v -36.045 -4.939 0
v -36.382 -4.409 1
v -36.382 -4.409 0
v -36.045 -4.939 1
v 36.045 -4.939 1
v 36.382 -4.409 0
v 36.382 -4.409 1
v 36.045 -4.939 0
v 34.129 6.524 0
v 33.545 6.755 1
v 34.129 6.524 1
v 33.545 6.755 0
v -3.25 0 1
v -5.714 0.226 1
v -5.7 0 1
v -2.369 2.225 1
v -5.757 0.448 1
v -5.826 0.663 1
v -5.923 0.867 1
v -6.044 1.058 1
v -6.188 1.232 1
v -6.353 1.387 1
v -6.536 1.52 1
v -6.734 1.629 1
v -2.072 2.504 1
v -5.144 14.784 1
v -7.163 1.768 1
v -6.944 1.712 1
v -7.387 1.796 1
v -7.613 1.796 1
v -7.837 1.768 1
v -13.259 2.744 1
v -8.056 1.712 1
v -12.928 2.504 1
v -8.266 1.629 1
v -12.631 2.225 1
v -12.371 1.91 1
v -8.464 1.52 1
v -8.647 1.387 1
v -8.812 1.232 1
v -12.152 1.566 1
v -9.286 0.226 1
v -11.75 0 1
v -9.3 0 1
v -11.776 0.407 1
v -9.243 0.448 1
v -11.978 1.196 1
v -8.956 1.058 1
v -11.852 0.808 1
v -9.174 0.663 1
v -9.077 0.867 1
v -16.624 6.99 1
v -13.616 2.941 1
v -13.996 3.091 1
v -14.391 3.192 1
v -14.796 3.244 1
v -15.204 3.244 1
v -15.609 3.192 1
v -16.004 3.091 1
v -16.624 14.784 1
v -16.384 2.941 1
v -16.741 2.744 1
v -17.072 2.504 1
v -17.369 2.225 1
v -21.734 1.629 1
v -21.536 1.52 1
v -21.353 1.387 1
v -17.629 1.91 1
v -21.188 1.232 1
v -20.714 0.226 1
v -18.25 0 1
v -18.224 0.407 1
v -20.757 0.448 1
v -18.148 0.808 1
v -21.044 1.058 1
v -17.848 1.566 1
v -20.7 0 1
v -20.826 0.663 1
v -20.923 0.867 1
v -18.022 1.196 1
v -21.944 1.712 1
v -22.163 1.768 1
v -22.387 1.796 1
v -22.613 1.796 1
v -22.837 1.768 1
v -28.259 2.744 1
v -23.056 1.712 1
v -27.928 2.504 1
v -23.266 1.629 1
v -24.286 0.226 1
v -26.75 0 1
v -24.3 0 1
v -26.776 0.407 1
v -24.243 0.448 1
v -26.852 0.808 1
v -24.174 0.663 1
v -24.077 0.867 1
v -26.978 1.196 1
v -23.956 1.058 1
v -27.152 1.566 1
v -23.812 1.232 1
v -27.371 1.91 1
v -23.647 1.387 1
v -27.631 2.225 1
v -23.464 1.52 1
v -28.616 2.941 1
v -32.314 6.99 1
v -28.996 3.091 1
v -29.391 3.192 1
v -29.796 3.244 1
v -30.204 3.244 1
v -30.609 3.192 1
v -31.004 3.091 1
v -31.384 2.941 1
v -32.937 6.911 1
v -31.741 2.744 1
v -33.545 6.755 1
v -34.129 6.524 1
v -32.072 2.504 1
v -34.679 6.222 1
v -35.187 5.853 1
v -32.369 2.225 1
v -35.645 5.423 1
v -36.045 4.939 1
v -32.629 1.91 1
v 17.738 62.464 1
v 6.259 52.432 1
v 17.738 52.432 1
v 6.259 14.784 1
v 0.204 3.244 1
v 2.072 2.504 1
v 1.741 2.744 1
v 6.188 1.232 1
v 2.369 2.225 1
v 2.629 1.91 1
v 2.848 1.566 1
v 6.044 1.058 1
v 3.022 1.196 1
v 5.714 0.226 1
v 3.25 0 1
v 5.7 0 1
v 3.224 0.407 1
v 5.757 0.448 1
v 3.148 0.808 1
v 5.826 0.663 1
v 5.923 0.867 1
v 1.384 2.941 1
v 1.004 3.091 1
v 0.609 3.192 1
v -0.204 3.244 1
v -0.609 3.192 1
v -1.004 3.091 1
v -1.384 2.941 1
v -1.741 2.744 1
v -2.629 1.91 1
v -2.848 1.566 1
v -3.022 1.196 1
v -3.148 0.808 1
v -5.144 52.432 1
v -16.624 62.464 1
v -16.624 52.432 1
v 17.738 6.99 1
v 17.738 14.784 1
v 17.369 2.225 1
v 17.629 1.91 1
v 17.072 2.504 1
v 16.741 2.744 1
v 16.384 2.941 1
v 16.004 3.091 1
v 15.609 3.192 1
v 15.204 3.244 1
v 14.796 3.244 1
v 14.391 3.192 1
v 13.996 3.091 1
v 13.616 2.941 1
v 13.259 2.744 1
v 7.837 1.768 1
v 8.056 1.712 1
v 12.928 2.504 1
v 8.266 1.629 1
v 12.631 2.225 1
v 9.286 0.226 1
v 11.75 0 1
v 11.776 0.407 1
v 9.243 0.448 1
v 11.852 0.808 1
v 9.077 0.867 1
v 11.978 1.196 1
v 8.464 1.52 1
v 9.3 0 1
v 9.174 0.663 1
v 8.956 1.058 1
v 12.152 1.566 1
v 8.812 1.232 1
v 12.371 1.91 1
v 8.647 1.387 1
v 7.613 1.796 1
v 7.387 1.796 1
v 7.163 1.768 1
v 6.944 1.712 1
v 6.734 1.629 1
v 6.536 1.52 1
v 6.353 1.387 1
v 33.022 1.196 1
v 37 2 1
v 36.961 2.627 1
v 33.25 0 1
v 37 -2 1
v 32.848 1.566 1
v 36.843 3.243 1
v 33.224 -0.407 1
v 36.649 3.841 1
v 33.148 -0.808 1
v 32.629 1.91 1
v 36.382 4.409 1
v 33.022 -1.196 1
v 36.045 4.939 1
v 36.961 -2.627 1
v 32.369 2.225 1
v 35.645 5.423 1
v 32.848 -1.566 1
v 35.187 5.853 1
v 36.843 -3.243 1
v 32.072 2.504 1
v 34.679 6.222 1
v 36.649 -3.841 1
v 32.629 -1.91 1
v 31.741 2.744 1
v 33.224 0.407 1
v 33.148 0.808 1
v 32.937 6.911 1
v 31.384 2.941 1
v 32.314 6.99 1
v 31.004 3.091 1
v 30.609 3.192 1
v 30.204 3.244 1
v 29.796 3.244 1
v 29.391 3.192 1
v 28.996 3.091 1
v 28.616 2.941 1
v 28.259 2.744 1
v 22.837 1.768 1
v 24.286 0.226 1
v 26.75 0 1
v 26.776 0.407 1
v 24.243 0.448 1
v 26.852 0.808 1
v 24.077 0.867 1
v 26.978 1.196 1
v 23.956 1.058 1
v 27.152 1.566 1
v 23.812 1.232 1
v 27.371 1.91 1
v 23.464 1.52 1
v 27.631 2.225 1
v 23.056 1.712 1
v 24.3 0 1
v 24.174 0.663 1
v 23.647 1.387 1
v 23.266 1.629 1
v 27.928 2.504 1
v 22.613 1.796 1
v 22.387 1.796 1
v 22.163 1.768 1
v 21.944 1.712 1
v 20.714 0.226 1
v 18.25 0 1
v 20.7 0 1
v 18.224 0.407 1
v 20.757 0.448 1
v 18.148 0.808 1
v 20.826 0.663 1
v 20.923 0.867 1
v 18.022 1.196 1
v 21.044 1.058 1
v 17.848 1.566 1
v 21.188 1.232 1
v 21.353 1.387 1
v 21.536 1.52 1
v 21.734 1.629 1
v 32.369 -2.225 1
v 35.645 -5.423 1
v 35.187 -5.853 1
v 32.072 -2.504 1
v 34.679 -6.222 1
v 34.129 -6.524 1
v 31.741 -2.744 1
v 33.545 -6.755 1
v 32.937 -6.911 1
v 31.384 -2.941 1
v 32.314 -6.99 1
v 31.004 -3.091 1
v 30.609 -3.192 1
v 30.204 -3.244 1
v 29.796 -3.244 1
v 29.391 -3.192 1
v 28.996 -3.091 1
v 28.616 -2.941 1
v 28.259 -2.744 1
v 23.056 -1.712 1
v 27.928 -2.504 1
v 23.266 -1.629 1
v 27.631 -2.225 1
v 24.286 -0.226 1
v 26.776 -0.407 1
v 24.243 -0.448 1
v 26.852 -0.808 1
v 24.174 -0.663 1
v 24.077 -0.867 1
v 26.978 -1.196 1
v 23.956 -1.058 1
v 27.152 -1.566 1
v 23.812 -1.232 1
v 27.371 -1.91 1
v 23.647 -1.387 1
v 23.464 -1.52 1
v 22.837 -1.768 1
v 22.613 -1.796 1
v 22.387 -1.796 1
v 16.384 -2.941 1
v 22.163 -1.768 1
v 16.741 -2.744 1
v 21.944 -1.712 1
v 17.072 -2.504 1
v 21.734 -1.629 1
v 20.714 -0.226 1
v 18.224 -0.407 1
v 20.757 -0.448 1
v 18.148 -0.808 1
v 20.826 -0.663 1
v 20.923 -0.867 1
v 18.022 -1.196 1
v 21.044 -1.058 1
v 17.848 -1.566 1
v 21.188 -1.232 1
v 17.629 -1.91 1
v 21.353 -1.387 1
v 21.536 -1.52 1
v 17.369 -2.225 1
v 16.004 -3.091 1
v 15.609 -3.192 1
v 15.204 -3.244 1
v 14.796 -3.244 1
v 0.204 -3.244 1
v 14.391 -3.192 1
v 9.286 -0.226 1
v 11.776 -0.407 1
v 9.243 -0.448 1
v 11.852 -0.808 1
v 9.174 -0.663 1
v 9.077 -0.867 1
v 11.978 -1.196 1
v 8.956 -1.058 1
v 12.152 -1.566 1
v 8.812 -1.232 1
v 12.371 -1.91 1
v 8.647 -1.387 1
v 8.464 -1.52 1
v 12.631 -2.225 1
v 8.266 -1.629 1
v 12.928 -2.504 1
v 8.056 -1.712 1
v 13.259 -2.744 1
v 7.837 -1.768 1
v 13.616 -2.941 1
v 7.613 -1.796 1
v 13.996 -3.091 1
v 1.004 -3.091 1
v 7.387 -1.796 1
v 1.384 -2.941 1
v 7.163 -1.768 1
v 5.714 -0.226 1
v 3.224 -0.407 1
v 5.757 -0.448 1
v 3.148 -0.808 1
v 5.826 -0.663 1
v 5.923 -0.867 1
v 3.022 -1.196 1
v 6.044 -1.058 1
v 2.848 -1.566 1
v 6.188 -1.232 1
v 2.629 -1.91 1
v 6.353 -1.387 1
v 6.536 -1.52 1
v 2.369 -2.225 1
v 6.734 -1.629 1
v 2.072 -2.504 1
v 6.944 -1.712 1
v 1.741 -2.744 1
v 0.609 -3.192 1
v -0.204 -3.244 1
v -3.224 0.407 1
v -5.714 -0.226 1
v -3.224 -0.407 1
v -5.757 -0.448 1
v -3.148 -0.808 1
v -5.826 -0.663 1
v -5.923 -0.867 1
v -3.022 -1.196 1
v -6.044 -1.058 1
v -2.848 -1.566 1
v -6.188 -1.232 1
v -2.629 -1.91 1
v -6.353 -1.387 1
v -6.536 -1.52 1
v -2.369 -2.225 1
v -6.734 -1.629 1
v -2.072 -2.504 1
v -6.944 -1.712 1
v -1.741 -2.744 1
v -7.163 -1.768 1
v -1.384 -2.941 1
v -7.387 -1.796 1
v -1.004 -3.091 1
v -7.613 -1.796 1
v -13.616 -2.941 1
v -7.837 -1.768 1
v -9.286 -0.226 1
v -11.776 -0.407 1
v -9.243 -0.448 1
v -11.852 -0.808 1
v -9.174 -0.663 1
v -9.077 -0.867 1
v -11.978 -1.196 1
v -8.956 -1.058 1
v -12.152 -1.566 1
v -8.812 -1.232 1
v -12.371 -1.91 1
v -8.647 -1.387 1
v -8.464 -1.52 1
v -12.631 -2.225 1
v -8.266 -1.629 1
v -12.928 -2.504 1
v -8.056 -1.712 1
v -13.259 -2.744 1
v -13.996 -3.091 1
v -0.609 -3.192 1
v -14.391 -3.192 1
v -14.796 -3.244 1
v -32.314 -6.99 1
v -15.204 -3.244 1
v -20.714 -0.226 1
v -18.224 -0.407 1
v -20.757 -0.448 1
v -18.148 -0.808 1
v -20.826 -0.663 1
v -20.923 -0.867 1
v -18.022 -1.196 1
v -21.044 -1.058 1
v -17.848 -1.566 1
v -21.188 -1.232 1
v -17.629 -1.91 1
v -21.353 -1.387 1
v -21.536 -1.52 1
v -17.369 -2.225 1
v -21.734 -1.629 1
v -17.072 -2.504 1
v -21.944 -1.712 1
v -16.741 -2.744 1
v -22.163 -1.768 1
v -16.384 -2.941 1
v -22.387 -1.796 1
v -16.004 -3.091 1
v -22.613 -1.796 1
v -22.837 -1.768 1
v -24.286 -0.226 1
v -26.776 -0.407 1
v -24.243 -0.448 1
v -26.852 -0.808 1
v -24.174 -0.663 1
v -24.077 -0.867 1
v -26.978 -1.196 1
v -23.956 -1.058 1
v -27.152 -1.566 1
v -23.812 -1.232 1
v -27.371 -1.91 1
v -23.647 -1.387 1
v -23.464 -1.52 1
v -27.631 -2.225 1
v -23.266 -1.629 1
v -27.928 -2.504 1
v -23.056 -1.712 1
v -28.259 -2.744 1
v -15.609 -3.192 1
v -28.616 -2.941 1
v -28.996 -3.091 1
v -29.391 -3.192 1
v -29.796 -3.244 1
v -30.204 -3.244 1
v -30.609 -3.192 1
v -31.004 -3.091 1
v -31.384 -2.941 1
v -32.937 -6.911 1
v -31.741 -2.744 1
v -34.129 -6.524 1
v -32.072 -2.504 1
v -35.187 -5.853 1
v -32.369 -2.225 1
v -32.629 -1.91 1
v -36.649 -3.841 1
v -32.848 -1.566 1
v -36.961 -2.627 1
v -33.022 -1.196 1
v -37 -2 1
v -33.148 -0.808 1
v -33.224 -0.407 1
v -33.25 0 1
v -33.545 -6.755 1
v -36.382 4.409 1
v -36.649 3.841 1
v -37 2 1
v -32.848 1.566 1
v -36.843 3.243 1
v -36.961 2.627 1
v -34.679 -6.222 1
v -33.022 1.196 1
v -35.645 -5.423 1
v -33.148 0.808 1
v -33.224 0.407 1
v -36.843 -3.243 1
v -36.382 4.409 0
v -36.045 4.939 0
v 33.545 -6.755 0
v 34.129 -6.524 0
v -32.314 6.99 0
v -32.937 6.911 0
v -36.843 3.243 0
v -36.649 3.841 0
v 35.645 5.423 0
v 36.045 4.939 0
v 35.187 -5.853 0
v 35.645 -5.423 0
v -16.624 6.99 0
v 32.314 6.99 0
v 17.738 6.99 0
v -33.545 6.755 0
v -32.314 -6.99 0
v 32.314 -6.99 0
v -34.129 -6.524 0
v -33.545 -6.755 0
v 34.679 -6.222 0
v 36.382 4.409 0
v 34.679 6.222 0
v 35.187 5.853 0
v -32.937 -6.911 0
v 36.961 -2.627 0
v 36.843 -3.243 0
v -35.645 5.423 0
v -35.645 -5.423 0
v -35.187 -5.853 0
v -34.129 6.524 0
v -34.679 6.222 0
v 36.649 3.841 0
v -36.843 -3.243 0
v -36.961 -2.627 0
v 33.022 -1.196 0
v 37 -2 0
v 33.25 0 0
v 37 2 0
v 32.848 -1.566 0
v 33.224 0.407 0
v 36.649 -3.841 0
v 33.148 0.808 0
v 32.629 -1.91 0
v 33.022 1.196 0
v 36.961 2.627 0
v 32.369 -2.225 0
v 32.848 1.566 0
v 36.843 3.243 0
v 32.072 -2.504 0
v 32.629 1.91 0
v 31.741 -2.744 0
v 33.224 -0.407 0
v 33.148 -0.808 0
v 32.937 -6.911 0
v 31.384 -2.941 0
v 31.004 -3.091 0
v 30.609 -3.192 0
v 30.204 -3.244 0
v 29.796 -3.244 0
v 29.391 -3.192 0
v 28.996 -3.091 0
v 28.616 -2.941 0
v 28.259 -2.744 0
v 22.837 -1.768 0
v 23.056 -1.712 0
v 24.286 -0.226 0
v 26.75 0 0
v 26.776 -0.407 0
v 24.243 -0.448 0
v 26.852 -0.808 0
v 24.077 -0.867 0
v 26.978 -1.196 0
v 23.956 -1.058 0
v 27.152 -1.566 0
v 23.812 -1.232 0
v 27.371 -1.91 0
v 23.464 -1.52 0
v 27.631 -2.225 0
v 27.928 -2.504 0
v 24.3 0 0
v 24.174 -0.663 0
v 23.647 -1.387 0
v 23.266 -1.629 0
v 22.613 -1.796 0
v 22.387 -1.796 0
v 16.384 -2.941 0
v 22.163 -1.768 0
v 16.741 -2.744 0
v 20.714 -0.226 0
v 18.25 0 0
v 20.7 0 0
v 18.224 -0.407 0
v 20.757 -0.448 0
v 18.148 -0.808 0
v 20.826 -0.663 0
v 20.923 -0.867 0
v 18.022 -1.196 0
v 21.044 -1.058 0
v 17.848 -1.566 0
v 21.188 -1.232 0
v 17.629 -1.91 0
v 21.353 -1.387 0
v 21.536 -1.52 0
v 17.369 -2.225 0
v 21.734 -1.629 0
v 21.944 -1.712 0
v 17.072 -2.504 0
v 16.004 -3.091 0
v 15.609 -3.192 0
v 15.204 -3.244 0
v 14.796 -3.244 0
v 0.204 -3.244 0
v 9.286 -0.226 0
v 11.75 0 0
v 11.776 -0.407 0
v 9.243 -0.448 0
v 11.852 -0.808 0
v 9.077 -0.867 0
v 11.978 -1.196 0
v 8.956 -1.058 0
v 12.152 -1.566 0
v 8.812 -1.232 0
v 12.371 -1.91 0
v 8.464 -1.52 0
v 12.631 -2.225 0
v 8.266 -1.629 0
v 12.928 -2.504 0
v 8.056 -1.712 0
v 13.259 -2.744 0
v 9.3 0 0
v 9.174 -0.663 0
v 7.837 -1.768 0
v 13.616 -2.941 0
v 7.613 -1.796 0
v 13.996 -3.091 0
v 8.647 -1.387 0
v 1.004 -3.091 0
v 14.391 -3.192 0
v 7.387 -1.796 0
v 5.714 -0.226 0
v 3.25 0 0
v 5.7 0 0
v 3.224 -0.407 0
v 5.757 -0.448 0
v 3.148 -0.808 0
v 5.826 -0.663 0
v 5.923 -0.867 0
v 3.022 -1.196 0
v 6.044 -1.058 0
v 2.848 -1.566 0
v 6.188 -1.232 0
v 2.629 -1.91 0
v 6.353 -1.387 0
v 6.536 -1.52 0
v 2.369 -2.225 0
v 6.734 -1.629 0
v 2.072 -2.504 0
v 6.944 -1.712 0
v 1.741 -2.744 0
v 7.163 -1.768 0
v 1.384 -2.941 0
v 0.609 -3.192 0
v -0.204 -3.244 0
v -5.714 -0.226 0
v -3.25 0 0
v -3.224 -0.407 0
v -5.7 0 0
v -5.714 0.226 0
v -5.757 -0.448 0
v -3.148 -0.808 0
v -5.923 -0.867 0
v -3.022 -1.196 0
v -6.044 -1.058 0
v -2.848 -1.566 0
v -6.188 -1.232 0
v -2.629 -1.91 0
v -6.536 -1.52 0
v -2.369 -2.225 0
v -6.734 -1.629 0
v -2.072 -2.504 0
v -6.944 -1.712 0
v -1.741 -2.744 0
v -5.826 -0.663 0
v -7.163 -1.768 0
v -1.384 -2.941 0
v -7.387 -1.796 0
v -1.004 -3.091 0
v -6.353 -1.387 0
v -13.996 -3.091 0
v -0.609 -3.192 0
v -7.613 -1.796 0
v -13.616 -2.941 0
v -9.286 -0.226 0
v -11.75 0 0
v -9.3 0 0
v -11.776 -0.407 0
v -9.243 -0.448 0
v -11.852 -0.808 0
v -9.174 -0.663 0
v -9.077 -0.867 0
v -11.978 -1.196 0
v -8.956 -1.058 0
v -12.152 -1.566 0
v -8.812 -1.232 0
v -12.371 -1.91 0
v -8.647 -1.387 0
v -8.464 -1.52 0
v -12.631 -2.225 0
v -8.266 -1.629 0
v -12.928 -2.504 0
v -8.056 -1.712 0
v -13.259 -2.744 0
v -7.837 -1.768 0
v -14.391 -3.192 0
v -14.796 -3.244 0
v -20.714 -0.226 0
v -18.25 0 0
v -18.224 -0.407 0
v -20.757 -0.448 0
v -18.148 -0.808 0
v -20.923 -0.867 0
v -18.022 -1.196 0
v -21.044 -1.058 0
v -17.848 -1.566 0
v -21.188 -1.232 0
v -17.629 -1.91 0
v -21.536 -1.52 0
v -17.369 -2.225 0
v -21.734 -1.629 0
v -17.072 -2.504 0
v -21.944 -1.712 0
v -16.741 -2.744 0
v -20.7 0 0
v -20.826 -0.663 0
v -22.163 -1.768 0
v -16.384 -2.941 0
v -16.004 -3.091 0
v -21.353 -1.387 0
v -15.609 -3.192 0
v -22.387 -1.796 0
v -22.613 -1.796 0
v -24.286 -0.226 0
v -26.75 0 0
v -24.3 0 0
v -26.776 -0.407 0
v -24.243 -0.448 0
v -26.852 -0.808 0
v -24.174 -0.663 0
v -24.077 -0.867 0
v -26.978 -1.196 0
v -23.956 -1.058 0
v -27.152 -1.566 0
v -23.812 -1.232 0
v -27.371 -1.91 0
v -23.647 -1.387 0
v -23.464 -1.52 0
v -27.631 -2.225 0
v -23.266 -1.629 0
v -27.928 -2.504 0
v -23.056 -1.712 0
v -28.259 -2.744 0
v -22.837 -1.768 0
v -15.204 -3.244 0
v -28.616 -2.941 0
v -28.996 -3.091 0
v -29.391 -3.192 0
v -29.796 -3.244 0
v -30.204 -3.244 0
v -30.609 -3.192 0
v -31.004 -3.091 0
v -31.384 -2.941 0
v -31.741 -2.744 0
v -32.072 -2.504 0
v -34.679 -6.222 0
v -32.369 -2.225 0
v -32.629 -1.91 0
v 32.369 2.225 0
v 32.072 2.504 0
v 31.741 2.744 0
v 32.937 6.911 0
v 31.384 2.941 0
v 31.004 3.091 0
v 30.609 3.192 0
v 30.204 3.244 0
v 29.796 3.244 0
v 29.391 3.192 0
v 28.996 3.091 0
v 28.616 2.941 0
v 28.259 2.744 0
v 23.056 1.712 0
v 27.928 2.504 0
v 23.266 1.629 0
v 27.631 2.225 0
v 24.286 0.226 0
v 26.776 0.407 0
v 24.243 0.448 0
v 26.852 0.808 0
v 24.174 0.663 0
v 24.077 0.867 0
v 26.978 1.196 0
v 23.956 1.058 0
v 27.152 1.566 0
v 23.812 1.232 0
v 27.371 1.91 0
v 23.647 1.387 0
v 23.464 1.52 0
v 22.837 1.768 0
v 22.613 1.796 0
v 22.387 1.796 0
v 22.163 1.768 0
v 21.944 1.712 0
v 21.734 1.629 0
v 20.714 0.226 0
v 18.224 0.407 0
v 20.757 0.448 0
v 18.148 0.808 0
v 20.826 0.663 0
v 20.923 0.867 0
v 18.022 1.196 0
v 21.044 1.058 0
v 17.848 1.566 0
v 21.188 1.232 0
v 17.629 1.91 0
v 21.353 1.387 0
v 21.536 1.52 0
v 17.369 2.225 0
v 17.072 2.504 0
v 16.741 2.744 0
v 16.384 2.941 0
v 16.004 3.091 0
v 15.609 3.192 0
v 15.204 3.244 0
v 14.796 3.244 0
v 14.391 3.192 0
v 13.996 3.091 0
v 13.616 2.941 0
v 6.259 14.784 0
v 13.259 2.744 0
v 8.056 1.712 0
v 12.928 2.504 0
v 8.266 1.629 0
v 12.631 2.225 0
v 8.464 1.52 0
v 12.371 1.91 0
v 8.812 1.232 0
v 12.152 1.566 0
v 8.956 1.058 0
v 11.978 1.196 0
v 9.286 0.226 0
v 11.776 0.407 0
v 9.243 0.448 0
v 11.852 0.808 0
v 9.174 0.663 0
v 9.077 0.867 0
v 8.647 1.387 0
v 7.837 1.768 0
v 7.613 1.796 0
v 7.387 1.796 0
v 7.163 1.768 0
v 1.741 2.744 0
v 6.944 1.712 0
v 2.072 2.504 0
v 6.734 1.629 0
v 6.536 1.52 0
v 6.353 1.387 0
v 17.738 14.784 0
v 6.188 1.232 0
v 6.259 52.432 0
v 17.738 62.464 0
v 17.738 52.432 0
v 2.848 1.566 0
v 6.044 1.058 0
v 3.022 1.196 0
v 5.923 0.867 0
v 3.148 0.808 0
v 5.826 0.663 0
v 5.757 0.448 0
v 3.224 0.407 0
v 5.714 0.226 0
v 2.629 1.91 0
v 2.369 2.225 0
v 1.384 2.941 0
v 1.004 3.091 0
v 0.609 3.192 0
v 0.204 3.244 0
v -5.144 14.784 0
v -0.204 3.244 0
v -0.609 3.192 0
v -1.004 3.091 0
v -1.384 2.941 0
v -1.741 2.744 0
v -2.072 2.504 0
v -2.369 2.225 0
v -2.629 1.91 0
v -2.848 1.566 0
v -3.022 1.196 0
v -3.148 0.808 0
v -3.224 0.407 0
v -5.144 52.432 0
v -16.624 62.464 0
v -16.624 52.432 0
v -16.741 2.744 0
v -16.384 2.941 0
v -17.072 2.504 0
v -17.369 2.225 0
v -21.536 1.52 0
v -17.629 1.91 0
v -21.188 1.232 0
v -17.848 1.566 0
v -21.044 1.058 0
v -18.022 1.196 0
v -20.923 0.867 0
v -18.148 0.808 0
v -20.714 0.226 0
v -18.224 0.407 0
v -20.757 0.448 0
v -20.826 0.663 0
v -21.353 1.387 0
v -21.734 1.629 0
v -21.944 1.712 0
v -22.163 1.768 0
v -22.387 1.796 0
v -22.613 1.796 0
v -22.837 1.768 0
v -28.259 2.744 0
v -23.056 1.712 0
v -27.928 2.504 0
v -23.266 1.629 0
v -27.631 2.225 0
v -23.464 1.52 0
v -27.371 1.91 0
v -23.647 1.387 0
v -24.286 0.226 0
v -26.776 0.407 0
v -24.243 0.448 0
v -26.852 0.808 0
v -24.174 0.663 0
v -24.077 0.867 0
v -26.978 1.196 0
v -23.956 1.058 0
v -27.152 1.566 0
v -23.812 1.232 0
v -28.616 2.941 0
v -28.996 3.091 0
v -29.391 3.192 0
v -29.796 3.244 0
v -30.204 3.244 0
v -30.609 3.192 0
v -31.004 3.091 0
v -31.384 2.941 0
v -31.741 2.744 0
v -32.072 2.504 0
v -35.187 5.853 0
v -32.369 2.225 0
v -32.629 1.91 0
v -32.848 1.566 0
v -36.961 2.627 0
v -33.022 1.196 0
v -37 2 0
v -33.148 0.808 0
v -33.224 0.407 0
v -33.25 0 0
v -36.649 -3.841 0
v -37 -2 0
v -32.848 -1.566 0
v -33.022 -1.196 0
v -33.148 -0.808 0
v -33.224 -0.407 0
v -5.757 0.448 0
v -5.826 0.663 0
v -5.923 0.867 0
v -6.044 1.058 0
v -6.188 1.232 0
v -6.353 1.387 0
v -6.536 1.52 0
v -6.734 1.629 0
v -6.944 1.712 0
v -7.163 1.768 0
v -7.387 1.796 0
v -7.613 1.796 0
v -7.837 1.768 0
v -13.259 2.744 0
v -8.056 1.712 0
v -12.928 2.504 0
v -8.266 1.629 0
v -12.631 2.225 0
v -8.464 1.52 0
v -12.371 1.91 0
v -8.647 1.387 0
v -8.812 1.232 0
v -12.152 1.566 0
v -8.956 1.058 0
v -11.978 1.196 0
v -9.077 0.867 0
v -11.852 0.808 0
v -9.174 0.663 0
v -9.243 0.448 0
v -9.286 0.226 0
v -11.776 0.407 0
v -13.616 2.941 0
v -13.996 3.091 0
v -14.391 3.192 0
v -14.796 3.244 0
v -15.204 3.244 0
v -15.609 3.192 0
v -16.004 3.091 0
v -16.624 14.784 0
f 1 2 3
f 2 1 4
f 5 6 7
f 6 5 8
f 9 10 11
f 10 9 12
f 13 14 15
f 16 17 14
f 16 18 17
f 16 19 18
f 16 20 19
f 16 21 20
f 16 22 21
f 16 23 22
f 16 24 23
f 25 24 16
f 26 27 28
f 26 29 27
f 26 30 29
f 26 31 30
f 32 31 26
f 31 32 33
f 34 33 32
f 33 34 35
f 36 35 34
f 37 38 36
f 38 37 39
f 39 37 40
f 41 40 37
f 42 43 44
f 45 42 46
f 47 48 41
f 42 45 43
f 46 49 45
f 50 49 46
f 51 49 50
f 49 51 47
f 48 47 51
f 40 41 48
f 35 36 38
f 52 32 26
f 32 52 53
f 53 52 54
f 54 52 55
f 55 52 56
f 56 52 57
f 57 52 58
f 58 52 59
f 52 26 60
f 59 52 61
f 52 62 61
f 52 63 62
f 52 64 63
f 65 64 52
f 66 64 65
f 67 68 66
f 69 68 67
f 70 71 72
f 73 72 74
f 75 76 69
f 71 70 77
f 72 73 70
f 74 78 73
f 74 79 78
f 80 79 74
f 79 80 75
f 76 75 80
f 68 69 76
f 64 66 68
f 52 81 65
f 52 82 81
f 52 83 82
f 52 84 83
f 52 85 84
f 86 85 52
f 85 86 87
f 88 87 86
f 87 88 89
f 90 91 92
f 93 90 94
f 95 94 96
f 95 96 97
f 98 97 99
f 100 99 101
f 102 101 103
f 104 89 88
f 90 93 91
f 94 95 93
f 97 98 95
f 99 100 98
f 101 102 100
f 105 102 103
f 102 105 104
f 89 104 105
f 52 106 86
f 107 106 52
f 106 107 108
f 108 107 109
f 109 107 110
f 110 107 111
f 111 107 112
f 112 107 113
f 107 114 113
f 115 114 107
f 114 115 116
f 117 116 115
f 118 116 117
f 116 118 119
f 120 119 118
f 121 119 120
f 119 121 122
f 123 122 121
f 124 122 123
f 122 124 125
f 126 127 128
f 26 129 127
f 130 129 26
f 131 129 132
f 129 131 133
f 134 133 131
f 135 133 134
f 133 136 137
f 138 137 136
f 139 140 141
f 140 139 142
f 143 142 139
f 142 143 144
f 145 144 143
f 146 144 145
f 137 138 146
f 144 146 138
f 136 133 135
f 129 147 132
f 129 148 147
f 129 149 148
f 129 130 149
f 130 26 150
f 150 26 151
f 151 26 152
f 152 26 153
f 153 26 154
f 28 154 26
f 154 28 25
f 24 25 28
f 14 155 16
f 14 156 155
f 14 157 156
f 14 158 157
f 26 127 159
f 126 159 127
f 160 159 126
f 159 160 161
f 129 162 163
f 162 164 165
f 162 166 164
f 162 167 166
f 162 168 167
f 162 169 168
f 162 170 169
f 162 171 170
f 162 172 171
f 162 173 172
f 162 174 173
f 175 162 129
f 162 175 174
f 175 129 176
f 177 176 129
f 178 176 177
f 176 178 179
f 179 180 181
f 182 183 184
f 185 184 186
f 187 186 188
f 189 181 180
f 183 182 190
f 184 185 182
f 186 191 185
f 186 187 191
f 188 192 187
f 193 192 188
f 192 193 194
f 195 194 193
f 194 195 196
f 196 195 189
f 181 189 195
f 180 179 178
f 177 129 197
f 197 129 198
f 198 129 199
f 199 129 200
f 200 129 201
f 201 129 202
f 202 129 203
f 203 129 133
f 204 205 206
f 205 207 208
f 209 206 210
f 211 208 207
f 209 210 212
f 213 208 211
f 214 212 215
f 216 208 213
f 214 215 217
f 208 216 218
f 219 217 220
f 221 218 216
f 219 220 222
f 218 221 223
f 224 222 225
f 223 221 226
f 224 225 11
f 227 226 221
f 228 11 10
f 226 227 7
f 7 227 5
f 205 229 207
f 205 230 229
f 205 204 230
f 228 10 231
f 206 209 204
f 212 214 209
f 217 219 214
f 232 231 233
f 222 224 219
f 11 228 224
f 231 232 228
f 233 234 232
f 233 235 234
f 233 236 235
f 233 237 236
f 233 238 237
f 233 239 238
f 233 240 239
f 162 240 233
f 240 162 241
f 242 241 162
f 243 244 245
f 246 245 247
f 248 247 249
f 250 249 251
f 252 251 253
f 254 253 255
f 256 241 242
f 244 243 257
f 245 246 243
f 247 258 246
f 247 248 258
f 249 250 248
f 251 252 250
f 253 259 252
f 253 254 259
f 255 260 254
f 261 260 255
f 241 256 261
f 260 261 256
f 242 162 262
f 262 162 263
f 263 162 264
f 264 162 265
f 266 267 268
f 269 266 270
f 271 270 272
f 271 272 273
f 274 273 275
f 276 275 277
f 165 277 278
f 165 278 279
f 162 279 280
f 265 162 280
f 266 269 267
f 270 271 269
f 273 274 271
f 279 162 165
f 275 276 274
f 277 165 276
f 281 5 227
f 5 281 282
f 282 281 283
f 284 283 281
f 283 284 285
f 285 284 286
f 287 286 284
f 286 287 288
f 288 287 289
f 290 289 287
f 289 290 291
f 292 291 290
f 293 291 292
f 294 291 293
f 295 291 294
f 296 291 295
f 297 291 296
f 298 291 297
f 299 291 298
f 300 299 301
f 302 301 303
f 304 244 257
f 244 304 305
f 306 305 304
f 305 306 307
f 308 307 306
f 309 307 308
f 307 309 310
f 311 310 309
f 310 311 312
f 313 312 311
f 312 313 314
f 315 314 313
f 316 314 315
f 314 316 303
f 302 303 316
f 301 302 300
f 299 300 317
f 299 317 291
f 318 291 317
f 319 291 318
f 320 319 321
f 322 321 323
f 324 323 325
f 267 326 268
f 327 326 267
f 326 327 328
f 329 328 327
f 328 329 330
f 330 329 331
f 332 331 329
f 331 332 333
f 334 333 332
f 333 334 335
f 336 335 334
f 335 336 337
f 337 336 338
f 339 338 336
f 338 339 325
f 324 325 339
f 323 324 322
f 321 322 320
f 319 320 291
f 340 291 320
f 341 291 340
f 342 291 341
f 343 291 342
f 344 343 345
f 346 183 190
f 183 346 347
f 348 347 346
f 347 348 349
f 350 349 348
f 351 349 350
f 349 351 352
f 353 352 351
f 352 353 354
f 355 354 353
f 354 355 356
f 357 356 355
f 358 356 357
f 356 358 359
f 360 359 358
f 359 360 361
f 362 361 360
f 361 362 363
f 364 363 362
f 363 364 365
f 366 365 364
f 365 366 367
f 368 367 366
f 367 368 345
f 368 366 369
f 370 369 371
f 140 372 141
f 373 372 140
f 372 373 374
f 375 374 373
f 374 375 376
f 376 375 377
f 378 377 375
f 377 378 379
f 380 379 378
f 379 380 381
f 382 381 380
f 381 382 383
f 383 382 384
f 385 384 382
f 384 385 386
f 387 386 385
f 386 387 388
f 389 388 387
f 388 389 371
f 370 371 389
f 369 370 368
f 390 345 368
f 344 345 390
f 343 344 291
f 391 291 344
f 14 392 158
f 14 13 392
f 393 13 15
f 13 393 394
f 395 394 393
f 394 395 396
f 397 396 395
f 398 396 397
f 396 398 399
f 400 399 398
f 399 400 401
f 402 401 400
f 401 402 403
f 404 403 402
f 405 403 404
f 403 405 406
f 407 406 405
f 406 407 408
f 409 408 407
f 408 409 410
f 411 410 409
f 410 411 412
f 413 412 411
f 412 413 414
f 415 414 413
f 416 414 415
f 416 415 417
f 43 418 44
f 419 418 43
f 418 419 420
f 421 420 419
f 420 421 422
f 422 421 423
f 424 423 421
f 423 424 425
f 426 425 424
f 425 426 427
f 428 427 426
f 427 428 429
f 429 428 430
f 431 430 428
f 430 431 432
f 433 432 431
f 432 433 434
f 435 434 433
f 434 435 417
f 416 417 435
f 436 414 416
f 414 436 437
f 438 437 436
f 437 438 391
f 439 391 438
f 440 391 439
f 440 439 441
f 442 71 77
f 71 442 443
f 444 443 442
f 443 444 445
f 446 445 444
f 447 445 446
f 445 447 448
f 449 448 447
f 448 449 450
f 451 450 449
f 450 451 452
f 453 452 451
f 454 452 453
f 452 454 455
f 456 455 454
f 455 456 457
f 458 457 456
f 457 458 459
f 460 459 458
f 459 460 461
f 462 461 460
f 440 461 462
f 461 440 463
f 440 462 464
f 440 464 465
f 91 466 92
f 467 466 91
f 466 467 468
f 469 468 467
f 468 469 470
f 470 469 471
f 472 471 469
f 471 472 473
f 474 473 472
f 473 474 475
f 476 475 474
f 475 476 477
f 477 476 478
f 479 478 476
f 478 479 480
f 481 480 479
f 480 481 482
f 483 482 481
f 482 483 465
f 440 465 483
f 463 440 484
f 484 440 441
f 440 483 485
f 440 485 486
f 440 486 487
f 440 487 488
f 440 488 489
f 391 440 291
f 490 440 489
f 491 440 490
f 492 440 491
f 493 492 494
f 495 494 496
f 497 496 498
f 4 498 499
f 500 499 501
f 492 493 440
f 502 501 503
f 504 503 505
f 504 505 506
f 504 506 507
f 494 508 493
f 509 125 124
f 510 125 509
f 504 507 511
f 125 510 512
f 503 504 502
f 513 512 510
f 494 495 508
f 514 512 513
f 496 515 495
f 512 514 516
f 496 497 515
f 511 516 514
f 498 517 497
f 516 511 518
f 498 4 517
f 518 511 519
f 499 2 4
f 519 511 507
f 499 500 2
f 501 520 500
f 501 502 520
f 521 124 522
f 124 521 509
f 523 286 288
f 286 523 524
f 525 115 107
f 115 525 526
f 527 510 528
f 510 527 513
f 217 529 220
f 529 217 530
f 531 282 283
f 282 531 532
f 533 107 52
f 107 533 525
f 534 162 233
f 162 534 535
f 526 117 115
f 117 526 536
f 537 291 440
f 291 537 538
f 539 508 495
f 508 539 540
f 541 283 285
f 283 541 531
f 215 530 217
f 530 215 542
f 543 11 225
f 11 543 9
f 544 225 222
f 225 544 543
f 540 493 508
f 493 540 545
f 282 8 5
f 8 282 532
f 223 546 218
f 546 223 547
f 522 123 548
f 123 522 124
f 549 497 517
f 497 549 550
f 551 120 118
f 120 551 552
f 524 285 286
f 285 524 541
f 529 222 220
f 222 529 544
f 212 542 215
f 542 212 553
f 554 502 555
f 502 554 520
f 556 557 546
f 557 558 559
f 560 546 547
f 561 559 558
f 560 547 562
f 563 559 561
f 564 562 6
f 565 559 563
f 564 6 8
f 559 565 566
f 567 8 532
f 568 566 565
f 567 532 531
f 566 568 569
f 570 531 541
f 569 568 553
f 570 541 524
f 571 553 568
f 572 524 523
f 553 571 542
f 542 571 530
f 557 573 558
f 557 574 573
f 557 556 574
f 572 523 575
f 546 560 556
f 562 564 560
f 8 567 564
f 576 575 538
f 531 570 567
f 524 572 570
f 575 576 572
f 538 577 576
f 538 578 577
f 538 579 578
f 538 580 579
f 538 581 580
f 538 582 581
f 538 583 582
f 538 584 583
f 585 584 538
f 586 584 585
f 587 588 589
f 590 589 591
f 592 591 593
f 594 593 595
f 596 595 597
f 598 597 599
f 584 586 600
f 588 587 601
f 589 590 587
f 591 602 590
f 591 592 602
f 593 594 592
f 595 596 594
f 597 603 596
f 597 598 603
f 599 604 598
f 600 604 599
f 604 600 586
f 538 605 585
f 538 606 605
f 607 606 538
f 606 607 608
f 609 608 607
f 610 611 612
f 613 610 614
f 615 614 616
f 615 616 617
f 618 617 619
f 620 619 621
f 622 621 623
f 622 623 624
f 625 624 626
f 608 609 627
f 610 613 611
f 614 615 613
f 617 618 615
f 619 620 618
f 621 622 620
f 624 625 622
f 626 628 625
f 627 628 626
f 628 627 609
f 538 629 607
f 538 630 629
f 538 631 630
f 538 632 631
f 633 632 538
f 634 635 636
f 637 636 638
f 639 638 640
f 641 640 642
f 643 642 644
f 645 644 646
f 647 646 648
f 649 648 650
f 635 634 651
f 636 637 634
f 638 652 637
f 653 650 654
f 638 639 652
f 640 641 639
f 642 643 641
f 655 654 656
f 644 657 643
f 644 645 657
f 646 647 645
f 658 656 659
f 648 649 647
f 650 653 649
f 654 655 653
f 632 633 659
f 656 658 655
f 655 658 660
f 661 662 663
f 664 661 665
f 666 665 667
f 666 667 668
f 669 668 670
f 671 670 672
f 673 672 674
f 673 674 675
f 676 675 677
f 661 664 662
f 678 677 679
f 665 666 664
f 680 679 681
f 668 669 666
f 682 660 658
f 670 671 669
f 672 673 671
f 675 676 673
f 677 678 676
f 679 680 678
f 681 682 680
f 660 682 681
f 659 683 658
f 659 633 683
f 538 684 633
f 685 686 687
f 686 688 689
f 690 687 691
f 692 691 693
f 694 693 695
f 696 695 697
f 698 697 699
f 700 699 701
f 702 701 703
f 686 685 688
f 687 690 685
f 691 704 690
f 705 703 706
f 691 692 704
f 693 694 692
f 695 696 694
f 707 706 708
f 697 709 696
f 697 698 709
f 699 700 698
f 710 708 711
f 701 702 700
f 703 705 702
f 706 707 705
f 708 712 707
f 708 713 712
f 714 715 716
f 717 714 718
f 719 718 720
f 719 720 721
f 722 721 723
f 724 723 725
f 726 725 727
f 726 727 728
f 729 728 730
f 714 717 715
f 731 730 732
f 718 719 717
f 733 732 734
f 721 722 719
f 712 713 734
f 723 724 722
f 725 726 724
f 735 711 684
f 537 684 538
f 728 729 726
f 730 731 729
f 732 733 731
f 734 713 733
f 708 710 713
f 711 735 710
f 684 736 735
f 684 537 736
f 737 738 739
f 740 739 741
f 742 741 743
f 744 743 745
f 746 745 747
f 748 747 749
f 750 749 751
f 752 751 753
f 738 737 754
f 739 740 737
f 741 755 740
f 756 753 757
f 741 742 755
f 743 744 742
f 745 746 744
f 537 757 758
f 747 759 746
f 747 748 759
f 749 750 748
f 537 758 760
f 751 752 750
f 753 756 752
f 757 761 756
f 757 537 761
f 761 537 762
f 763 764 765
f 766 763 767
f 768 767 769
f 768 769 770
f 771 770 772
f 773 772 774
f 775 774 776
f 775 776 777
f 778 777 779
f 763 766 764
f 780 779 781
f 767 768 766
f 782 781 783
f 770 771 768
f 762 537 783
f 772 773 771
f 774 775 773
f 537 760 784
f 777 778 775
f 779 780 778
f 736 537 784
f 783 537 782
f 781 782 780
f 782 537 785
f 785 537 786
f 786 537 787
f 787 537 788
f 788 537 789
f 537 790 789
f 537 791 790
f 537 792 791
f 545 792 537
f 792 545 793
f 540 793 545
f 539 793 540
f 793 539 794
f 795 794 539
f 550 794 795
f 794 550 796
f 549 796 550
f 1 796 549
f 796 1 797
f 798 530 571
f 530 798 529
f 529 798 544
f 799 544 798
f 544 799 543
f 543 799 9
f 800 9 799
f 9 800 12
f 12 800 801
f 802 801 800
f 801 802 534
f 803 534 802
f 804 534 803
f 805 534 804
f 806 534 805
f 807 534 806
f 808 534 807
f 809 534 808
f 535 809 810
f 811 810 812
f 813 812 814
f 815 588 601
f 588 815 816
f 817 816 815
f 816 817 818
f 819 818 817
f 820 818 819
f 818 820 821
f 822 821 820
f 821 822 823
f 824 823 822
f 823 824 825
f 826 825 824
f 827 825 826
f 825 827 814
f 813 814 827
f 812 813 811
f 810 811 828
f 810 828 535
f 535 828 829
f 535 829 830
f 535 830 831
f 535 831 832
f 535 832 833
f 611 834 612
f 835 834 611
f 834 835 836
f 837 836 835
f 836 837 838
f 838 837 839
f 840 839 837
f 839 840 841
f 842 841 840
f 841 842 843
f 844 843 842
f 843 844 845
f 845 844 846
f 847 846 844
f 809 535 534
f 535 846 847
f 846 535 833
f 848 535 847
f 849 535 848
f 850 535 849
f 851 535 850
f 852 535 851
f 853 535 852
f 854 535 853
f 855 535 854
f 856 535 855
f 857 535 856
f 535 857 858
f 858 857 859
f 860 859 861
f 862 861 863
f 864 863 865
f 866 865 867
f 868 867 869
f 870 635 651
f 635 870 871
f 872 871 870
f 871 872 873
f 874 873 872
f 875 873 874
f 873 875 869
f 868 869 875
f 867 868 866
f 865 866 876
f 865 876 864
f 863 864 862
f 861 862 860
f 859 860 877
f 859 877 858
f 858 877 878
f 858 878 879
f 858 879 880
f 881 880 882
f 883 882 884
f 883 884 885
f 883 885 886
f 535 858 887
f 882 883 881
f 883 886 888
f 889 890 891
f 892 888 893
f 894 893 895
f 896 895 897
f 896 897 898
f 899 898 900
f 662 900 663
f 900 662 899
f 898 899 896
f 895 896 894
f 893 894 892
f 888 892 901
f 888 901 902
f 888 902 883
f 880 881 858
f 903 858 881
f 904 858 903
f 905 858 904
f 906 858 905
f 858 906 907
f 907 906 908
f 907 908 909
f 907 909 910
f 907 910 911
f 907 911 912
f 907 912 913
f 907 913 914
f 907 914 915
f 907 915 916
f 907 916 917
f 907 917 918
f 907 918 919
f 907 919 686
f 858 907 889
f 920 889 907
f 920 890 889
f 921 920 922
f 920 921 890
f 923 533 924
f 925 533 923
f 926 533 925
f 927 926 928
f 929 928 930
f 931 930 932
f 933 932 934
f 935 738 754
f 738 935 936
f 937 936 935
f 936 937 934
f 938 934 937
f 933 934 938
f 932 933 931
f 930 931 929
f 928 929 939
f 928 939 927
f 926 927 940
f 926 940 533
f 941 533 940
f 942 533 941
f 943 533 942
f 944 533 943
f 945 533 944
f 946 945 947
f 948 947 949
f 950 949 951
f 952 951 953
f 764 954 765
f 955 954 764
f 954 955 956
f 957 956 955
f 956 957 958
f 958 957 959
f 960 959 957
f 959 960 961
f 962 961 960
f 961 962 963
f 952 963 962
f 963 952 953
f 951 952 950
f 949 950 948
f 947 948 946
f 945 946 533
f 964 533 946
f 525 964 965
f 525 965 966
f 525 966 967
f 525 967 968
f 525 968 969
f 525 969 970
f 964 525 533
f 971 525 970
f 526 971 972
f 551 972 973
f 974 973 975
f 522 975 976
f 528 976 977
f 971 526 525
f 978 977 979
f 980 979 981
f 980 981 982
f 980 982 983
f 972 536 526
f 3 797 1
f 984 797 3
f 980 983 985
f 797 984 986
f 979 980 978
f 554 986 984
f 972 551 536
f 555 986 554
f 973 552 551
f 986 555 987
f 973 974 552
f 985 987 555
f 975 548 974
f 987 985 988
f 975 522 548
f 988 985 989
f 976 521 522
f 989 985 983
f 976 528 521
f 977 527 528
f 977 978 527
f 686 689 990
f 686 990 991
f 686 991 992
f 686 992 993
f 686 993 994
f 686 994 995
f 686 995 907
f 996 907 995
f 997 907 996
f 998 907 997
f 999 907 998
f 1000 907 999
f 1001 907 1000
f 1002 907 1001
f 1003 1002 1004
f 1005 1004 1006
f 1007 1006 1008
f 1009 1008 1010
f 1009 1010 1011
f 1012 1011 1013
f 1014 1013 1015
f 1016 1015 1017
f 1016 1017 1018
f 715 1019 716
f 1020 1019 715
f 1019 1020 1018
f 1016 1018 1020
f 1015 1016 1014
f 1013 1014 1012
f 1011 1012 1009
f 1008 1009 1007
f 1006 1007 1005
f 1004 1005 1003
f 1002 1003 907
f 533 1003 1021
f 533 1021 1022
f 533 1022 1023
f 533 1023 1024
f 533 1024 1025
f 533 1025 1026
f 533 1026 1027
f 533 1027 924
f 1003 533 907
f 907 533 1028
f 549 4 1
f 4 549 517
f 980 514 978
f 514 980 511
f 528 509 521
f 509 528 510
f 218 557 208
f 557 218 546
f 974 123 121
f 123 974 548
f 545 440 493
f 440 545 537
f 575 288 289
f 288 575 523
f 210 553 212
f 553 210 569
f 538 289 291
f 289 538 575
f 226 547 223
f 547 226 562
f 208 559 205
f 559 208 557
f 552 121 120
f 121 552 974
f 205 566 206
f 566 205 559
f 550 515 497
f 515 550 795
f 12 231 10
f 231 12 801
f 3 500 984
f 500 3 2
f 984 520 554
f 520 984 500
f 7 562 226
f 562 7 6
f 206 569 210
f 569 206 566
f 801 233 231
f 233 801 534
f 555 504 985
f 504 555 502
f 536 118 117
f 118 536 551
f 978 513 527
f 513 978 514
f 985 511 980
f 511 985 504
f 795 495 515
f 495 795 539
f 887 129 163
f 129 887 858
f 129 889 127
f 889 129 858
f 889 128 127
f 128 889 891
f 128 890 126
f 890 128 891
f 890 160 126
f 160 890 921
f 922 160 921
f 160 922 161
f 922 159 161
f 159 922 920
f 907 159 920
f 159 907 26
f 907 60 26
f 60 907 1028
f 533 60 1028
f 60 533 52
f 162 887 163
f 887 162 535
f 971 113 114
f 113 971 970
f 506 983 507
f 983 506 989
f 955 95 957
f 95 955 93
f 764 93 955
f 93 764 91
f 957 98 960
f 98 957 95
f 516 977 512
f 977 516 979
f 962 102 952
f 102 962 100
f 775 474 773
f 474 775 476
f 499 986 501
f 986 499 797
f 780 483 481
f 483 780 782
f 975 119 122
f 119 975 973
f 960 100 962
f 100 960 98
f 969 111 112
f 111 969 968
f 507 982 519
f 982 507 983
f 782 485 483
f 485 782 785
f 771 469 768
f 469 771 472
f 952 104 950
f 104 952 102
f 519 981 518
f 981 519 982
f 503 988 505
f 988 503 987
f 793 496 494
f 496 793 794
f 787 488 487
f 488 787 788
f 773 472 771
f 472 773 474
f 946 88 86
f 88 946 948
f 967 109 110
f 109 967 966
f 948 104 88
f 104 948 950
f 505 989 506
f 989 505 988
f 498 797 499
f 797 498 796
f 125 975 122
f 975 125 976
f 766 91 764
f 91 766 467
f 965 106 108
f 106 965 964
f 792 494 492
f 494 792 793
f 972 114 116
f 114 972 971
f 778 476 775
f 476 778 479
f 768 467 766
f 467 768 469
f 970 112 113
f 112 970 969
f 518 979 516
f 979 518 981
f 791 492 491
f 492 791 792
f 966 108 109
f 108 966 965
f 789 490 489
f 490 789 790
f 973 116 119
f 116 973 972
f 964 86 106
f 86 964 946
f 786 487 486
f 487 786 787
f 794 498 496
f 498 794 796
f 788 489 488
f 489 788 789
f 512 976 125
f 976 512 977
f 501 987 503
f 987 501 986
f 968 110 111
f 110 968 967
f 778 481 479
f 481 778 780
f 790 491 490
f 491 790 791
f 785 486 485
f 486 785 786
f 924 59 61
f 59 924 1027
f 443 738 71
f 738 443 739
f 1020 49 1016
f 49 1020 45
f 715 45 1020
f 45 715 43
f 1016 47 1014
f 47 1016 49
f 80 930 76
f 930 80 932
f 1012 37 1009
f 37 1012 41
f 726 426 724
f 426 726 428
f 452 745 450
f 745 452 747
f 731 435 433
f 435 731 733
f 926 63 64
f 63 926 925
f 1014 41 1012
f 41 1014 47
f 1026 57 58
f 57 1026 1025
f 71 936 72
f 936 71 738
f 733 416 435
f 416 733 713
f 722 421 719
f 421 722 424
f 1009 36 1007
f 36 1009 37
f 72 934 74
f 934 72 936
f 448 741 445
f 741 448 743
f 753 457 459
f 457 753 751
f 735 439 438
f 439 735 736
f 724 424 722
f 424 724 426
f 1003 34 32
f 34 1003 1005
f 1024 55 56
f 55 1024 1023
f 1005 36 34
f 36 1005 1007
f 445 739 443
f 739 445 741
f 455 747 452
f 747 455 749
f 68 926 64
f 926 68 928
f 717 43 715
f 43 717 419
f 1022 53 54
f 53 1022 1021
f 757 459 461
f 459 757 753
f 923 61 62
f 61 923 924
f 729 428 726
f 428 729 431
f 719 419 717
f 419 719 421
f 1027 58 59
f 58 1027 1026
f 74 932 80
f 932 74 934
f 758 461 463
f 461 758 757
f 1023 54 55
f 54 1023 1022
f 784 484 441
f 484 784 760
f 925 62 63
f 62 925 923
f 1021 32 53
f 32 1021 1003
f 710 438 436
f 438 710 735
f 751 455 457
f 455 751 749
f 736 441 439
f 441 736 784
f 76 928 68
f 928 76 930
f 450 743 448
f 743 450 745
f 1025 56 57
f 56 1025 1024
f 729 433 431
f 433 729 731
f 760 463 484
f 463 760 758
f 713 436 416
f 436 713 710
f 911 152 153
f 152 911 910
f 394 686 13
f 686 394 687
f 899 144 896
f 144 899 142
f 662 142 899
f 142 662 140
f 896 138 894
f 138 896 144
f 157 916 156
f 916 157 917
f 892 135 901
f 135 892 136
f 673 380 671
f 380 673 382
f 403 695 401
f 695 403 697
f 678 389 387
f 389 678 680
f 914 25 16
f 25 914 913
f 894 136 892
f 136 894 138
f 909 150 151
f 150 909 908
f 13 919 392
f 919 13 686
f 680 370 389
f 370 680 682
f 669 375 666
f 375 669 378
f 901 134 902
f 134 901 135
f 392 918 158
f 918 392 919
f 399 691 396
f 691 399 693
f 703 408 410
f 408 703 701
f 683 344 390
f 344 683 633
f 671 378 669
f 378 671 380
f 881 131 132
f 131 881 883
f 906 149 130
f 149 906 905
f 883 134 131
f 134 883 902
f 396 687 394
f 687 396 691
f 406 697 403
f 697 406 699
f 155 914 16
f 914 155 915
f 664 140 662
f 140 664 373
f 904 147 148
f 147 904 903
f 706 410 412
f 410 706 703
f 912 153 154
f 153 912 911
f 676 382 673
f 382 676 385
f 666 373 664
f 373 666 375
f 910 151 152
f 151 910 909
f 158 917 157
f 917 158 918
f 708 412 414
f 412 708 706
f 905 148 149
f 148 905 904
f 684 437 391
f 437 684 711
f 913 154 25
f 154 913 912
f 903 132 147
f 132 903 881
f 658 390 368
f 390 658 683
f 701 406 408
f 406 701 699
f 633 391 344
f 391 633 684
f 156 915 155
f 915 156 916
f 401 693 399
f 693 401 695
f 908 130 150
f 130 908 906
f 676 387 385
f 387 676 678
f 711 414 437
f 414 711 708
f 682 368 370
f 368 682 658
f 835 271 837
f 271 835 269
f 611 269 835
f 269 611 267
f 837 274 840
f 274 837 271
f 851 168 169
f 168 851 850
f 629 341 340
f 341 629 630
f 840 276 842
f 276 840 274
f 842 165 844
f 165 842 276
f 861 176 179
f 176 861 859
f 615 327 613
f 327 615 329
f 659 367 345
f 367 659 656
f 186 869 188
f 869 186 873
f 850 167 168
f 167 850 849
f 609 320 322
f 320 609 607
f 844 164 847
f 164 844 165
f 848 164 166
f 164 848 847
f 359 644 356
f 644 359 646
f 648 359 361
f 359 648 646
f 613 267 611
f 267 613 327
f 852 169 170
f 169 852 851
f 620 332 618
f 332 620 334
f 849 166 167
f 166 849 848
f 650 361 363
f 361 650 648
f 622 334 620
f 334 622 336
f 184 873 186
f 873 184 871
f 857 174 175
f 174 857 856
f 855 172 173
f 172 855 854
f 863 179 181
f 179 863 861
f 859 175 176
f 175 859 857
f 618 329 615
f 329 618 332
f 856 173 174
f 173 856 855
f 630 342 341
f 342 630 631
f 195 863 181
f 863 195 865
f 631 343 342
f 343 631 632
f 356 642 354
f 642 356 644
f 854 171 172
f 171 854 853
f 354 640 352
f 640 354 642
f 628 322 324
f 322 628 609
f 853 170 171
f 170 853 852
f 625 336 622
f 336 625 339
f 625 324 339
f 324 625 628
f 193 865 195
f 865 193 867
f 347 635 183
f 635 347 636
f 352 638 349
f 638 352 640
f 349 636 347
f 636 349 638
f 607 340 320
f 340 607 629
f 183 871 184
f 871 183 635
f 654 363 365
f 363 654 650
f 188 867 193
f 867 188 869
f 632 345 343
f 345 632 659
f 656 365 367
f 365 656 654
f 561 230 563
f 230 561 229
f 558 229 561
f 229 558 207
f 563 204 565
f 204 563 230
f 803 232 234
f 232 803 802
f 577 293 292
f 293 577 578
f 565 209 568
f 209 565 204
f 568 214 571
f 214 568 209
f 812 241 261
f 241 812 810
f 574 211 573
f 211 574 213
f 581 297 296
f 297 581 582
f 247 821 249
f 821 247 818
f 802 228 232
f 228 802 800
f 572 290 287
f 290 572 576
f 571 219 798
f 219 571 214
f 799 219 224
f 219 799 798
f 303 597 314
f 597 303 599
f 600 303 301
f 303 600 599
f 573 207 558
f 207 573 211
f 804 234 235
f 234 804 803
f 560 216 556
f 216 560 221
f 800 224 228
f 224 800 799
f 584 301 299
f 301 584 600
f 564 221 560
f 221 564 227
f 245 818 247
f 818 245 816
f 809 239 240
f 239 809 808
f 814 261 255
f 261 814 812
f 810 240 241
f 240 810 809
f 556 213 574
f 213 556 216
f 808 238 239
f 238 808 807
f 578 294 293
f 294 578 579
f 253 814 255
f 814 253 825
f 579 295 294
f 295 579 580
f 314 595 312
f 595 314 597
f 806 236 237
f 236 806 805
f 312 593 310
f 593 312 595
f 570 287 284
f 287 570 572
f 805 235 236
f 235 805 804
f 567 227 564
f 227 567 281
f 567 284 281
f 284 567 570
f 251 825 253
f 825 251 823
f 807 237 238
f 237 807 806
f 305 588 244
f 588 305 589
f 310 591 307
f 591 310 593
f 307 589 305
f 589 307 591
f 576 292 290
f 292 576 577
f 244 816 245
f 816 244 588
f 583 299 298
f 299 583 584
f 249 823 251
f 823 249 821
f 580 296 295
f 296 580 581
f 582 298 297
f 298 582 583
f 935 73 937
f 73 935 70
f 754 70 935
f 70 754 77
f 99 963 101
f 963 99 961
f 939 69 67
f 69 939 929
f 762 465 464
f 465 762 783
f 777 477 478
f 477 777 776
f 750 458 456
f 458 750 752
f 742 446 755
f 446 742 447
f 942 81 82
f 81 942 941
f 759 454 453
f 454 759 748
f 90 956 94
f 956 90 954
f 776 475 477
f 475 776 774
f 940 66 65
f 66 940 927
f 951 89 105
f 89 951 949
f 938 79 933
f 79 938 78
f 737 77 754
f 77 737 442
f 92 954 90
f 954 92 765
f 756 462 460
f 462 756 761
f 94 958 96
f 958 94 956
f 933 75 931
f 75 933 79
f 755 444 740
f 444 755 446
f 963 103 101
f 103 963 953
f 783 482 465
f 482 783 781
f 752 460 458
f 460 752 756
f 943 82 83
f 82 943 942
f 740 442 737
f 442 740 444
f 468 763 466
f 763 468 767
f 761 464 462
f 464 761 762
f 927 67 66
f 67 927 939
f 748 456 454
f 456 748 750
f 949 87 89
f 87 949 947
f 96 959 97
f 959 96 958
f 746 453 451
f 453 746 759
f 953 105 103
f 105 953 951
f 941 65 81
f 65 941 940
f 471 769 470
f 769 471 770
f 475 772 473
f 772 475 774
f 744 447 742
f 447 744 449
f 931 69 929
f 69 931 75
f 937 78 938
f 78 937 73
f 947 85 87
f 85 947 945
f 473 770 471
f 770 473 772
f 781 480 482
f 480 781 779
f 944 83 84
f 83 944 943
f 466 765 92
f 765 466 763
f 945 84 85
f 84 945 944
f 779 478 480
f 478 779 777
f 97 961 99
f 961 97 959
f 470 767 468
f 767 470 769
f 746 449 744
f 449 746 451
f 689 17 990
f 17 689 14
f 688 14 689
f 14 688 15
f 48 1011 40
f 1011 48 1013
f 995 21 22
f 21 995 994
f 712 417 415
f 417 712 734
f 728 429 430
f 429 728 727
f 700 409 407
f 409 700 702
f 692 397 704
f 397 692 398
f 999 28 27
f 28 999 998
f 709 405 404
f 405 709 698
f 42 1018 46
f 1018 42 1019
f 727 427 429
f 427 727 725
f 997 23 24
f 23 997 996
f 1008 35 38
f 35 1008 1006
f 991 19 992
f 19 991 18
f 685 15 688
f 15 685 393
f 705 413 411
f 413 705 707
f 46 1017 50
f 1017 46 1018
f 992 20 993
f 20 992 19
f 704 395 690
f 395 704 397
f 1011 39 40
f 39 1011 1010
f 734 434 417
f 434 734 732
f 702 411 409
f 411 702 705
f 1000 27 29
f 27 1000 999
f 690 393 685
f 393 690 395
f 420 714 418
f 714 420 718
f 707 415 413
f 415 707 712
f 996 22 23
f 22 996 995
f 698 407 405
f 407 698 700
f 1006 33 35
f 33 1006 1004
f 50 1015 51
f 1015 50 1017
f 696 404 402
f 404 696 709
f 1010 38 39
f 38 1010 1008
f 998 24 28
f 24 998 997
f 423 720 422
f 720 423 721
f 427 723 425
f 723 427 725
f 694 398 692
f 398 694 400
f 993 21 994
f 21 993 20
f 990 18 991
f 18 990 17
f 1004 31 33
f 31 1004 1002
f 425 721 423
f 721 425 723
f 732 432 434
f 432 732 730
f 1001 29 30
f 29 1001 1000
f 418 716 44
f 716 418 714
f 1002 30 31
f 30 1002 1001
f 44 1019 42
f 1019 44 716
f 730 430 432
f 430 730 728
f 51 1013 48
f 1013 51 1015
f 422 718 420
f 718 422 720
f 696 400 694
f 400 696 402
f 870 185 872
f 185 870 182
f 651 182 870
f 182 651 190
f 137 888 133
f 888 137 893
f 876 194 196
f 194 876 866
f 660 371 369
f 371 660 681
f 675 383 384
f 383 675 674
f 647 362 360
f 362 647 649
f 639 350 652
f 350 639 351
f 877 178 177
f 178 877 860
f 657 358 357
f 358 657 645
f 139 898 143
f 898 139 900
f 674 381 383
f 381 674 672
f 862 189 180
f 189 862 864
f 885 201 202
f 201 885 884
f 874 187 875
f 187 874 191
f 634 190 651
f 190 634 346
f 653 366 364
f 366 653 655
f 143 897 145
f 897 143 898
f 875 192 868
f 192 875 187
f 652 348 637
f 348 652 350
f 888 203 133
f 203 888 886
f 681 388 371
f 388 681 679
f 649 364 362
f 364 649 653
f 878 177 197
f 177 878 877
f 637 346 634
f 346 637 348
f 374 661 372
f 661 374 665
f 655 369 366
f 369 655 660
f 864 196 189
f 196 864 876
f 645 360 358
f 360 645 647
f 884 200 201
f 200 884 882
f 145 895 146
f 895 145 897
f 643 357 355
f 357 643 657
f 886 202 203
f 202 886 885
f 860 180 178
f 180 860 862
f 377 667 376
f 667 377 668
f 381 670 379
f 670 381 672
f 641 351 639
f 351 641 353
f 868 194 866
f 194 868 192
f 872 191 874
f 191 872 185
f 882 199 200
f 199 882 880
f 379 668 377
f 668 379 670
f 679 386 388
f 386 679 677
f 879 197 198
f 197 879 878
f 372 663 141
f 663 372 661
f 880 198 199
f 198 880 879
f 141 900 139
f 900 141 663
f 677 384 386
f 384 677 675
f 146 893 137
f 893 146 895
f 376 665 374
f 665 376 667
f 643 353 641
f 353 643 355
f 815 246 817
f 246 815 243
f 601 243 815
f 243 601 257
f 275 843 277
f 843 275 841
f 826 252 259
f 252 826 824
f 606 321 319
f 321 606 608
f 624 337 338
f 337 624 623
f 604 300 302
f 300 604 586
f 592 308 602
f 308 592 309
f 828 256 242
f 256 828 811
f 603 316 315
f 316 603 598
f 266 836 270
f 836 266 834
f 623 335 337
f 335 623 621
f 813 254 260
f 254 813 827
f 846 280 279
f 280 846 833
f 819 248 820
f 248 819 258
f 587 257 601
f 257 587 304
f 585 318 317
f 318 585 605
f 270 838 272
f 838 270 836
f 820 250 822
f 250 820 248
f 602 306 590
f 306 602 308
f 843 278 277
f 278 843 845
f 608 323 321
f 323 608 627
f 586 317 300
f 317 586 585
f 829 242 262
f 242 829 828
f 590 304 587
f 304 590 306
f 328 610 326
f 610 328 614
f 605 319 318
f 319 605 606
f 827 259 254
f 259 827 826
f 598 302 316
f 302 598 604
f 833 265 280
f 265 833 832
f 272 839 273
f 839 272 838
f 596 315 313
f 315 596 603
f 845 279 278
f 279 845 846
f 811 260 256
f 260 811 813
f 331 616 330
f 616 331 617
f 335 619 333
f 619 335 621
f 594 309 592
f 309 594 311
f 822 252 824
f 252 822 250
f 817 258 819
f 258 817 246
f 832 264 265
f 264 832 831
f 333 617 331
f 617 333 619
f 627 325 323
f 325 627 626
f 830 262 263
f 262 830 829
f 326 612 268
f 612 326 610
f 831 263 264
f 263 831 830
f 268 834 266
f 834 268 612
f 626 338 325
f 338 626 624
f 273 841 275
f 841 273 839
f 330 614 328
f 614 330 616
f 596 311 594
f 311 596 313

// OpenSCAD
$fn = 50;


difference() {
	union() {
		hull() {
			translate(v = [-32.0000000000, 2.0000000000, 0]) {
				cylinder(h = 1, r = 5);
			}
			translate(v = [32.0000000000, 2.0000000000, 0]) {
				cylinder(h = 1, r = 5);
			}
			translate(v = [-32.0000000000, -2.0000000000, 0]) {
				cylinder(h = 1, r = 5);
			}
			translate(v = [32.0000000000, -2.0000000000, 0]) {
				cylinder(h = 1, r = 5);
			}
		}
		translate(v = [0, 61.1111111111, 0]) {
			linear_extrude(height = 1) {
				text(font = "DejaVu Sans Mono:style=Bold", halign = "center", size = 57.0000000000, text = "I", valign = "top");
			}
		}
	}
	union() {
		translate(v = [-30.0000000000, 0.0000000000, 0]) {
			translate(v = [0, 0, -100]) {
				cylinder(h = 200, r = 3.2500000000);
			}
		}
		translate(v = [-15.0000000000, 0.0000000000, 0]) {
			translate(v = [0, 0, -100]) {
				cylinder(h = 200, r = 3.2500000000);
			}
		}
		translate(v = [0, 0, -100]) {
			cylinder(h = 200, r = 3.2500000000);
		}
		translate(v = [15.0000000000, 0.0000000000, 0]) {
			translate(v = [0, 0, -100]) {
				cylinder(h = 200, r = 3.2500000000);
			}
		}
		translate(v = [30.0000000000, 0.0000000000, 0]) {
			translate(v = [0, 0, -100]) {
				cylinder(h = 200, r = 3.2500000000);
			}
		}
		translate(v = [-30.0000000000, 0.0000000000, 0]) {
			translate(v = [0, 0, -100]) {
				cylinder(h = 200, r = 1.8000000000);
			}
		}
		translate(v = [-22.5000000000, 0.0000000000, 0]) {
			translate(v = [0, 0, -100]) {
				cylinder(h = 200, r = 1.8000000000);
			}
		}
		translate(v = [-15.0000000000, 0.0000000000, 0]) {
			translate(v = [0, 0, -100]) {
				cylinder(h = 200, r = 1.8000000000);
			}
		}
		translate(v = [-7.5000000000, 0.0000000000, 0]) {
			translate(v = [0, 0, -100]) {
				cylinder(h = 200, r = 1.8000000000);
			}
		}
		translate(v = [0, 0, -100]) {
			cylinder(h = 200, r = 1.8000000000);
		}
		translate(v = [7.5000000000, 0.0000000000, 0]) {
			translate(v = [0, 0, -100]) {
				cylinder(h = 200, r = 1.8000000000);
			}
		}
		translate(v = [15.0000000000, 0.0000000000, 0]) {
			translate(v = [0, 0, -100]) {
				cylinder(h = 200, r = 1.8000000000);
			}
		}
		translate(v = [22.5000000000, 0.0000000000, 0]) {
			translate(v = [0, 0, -100]) {
				cylinder(h = 200, r = 1.8000000000);
			}
		}
		translate(v = [30.0000000000, 0.0000000000, 0]) {
			translate(v = [0, 0, -100]) {
				cylinder(h = 200, r = 1.8000000000);
			}
		}
	}
}
